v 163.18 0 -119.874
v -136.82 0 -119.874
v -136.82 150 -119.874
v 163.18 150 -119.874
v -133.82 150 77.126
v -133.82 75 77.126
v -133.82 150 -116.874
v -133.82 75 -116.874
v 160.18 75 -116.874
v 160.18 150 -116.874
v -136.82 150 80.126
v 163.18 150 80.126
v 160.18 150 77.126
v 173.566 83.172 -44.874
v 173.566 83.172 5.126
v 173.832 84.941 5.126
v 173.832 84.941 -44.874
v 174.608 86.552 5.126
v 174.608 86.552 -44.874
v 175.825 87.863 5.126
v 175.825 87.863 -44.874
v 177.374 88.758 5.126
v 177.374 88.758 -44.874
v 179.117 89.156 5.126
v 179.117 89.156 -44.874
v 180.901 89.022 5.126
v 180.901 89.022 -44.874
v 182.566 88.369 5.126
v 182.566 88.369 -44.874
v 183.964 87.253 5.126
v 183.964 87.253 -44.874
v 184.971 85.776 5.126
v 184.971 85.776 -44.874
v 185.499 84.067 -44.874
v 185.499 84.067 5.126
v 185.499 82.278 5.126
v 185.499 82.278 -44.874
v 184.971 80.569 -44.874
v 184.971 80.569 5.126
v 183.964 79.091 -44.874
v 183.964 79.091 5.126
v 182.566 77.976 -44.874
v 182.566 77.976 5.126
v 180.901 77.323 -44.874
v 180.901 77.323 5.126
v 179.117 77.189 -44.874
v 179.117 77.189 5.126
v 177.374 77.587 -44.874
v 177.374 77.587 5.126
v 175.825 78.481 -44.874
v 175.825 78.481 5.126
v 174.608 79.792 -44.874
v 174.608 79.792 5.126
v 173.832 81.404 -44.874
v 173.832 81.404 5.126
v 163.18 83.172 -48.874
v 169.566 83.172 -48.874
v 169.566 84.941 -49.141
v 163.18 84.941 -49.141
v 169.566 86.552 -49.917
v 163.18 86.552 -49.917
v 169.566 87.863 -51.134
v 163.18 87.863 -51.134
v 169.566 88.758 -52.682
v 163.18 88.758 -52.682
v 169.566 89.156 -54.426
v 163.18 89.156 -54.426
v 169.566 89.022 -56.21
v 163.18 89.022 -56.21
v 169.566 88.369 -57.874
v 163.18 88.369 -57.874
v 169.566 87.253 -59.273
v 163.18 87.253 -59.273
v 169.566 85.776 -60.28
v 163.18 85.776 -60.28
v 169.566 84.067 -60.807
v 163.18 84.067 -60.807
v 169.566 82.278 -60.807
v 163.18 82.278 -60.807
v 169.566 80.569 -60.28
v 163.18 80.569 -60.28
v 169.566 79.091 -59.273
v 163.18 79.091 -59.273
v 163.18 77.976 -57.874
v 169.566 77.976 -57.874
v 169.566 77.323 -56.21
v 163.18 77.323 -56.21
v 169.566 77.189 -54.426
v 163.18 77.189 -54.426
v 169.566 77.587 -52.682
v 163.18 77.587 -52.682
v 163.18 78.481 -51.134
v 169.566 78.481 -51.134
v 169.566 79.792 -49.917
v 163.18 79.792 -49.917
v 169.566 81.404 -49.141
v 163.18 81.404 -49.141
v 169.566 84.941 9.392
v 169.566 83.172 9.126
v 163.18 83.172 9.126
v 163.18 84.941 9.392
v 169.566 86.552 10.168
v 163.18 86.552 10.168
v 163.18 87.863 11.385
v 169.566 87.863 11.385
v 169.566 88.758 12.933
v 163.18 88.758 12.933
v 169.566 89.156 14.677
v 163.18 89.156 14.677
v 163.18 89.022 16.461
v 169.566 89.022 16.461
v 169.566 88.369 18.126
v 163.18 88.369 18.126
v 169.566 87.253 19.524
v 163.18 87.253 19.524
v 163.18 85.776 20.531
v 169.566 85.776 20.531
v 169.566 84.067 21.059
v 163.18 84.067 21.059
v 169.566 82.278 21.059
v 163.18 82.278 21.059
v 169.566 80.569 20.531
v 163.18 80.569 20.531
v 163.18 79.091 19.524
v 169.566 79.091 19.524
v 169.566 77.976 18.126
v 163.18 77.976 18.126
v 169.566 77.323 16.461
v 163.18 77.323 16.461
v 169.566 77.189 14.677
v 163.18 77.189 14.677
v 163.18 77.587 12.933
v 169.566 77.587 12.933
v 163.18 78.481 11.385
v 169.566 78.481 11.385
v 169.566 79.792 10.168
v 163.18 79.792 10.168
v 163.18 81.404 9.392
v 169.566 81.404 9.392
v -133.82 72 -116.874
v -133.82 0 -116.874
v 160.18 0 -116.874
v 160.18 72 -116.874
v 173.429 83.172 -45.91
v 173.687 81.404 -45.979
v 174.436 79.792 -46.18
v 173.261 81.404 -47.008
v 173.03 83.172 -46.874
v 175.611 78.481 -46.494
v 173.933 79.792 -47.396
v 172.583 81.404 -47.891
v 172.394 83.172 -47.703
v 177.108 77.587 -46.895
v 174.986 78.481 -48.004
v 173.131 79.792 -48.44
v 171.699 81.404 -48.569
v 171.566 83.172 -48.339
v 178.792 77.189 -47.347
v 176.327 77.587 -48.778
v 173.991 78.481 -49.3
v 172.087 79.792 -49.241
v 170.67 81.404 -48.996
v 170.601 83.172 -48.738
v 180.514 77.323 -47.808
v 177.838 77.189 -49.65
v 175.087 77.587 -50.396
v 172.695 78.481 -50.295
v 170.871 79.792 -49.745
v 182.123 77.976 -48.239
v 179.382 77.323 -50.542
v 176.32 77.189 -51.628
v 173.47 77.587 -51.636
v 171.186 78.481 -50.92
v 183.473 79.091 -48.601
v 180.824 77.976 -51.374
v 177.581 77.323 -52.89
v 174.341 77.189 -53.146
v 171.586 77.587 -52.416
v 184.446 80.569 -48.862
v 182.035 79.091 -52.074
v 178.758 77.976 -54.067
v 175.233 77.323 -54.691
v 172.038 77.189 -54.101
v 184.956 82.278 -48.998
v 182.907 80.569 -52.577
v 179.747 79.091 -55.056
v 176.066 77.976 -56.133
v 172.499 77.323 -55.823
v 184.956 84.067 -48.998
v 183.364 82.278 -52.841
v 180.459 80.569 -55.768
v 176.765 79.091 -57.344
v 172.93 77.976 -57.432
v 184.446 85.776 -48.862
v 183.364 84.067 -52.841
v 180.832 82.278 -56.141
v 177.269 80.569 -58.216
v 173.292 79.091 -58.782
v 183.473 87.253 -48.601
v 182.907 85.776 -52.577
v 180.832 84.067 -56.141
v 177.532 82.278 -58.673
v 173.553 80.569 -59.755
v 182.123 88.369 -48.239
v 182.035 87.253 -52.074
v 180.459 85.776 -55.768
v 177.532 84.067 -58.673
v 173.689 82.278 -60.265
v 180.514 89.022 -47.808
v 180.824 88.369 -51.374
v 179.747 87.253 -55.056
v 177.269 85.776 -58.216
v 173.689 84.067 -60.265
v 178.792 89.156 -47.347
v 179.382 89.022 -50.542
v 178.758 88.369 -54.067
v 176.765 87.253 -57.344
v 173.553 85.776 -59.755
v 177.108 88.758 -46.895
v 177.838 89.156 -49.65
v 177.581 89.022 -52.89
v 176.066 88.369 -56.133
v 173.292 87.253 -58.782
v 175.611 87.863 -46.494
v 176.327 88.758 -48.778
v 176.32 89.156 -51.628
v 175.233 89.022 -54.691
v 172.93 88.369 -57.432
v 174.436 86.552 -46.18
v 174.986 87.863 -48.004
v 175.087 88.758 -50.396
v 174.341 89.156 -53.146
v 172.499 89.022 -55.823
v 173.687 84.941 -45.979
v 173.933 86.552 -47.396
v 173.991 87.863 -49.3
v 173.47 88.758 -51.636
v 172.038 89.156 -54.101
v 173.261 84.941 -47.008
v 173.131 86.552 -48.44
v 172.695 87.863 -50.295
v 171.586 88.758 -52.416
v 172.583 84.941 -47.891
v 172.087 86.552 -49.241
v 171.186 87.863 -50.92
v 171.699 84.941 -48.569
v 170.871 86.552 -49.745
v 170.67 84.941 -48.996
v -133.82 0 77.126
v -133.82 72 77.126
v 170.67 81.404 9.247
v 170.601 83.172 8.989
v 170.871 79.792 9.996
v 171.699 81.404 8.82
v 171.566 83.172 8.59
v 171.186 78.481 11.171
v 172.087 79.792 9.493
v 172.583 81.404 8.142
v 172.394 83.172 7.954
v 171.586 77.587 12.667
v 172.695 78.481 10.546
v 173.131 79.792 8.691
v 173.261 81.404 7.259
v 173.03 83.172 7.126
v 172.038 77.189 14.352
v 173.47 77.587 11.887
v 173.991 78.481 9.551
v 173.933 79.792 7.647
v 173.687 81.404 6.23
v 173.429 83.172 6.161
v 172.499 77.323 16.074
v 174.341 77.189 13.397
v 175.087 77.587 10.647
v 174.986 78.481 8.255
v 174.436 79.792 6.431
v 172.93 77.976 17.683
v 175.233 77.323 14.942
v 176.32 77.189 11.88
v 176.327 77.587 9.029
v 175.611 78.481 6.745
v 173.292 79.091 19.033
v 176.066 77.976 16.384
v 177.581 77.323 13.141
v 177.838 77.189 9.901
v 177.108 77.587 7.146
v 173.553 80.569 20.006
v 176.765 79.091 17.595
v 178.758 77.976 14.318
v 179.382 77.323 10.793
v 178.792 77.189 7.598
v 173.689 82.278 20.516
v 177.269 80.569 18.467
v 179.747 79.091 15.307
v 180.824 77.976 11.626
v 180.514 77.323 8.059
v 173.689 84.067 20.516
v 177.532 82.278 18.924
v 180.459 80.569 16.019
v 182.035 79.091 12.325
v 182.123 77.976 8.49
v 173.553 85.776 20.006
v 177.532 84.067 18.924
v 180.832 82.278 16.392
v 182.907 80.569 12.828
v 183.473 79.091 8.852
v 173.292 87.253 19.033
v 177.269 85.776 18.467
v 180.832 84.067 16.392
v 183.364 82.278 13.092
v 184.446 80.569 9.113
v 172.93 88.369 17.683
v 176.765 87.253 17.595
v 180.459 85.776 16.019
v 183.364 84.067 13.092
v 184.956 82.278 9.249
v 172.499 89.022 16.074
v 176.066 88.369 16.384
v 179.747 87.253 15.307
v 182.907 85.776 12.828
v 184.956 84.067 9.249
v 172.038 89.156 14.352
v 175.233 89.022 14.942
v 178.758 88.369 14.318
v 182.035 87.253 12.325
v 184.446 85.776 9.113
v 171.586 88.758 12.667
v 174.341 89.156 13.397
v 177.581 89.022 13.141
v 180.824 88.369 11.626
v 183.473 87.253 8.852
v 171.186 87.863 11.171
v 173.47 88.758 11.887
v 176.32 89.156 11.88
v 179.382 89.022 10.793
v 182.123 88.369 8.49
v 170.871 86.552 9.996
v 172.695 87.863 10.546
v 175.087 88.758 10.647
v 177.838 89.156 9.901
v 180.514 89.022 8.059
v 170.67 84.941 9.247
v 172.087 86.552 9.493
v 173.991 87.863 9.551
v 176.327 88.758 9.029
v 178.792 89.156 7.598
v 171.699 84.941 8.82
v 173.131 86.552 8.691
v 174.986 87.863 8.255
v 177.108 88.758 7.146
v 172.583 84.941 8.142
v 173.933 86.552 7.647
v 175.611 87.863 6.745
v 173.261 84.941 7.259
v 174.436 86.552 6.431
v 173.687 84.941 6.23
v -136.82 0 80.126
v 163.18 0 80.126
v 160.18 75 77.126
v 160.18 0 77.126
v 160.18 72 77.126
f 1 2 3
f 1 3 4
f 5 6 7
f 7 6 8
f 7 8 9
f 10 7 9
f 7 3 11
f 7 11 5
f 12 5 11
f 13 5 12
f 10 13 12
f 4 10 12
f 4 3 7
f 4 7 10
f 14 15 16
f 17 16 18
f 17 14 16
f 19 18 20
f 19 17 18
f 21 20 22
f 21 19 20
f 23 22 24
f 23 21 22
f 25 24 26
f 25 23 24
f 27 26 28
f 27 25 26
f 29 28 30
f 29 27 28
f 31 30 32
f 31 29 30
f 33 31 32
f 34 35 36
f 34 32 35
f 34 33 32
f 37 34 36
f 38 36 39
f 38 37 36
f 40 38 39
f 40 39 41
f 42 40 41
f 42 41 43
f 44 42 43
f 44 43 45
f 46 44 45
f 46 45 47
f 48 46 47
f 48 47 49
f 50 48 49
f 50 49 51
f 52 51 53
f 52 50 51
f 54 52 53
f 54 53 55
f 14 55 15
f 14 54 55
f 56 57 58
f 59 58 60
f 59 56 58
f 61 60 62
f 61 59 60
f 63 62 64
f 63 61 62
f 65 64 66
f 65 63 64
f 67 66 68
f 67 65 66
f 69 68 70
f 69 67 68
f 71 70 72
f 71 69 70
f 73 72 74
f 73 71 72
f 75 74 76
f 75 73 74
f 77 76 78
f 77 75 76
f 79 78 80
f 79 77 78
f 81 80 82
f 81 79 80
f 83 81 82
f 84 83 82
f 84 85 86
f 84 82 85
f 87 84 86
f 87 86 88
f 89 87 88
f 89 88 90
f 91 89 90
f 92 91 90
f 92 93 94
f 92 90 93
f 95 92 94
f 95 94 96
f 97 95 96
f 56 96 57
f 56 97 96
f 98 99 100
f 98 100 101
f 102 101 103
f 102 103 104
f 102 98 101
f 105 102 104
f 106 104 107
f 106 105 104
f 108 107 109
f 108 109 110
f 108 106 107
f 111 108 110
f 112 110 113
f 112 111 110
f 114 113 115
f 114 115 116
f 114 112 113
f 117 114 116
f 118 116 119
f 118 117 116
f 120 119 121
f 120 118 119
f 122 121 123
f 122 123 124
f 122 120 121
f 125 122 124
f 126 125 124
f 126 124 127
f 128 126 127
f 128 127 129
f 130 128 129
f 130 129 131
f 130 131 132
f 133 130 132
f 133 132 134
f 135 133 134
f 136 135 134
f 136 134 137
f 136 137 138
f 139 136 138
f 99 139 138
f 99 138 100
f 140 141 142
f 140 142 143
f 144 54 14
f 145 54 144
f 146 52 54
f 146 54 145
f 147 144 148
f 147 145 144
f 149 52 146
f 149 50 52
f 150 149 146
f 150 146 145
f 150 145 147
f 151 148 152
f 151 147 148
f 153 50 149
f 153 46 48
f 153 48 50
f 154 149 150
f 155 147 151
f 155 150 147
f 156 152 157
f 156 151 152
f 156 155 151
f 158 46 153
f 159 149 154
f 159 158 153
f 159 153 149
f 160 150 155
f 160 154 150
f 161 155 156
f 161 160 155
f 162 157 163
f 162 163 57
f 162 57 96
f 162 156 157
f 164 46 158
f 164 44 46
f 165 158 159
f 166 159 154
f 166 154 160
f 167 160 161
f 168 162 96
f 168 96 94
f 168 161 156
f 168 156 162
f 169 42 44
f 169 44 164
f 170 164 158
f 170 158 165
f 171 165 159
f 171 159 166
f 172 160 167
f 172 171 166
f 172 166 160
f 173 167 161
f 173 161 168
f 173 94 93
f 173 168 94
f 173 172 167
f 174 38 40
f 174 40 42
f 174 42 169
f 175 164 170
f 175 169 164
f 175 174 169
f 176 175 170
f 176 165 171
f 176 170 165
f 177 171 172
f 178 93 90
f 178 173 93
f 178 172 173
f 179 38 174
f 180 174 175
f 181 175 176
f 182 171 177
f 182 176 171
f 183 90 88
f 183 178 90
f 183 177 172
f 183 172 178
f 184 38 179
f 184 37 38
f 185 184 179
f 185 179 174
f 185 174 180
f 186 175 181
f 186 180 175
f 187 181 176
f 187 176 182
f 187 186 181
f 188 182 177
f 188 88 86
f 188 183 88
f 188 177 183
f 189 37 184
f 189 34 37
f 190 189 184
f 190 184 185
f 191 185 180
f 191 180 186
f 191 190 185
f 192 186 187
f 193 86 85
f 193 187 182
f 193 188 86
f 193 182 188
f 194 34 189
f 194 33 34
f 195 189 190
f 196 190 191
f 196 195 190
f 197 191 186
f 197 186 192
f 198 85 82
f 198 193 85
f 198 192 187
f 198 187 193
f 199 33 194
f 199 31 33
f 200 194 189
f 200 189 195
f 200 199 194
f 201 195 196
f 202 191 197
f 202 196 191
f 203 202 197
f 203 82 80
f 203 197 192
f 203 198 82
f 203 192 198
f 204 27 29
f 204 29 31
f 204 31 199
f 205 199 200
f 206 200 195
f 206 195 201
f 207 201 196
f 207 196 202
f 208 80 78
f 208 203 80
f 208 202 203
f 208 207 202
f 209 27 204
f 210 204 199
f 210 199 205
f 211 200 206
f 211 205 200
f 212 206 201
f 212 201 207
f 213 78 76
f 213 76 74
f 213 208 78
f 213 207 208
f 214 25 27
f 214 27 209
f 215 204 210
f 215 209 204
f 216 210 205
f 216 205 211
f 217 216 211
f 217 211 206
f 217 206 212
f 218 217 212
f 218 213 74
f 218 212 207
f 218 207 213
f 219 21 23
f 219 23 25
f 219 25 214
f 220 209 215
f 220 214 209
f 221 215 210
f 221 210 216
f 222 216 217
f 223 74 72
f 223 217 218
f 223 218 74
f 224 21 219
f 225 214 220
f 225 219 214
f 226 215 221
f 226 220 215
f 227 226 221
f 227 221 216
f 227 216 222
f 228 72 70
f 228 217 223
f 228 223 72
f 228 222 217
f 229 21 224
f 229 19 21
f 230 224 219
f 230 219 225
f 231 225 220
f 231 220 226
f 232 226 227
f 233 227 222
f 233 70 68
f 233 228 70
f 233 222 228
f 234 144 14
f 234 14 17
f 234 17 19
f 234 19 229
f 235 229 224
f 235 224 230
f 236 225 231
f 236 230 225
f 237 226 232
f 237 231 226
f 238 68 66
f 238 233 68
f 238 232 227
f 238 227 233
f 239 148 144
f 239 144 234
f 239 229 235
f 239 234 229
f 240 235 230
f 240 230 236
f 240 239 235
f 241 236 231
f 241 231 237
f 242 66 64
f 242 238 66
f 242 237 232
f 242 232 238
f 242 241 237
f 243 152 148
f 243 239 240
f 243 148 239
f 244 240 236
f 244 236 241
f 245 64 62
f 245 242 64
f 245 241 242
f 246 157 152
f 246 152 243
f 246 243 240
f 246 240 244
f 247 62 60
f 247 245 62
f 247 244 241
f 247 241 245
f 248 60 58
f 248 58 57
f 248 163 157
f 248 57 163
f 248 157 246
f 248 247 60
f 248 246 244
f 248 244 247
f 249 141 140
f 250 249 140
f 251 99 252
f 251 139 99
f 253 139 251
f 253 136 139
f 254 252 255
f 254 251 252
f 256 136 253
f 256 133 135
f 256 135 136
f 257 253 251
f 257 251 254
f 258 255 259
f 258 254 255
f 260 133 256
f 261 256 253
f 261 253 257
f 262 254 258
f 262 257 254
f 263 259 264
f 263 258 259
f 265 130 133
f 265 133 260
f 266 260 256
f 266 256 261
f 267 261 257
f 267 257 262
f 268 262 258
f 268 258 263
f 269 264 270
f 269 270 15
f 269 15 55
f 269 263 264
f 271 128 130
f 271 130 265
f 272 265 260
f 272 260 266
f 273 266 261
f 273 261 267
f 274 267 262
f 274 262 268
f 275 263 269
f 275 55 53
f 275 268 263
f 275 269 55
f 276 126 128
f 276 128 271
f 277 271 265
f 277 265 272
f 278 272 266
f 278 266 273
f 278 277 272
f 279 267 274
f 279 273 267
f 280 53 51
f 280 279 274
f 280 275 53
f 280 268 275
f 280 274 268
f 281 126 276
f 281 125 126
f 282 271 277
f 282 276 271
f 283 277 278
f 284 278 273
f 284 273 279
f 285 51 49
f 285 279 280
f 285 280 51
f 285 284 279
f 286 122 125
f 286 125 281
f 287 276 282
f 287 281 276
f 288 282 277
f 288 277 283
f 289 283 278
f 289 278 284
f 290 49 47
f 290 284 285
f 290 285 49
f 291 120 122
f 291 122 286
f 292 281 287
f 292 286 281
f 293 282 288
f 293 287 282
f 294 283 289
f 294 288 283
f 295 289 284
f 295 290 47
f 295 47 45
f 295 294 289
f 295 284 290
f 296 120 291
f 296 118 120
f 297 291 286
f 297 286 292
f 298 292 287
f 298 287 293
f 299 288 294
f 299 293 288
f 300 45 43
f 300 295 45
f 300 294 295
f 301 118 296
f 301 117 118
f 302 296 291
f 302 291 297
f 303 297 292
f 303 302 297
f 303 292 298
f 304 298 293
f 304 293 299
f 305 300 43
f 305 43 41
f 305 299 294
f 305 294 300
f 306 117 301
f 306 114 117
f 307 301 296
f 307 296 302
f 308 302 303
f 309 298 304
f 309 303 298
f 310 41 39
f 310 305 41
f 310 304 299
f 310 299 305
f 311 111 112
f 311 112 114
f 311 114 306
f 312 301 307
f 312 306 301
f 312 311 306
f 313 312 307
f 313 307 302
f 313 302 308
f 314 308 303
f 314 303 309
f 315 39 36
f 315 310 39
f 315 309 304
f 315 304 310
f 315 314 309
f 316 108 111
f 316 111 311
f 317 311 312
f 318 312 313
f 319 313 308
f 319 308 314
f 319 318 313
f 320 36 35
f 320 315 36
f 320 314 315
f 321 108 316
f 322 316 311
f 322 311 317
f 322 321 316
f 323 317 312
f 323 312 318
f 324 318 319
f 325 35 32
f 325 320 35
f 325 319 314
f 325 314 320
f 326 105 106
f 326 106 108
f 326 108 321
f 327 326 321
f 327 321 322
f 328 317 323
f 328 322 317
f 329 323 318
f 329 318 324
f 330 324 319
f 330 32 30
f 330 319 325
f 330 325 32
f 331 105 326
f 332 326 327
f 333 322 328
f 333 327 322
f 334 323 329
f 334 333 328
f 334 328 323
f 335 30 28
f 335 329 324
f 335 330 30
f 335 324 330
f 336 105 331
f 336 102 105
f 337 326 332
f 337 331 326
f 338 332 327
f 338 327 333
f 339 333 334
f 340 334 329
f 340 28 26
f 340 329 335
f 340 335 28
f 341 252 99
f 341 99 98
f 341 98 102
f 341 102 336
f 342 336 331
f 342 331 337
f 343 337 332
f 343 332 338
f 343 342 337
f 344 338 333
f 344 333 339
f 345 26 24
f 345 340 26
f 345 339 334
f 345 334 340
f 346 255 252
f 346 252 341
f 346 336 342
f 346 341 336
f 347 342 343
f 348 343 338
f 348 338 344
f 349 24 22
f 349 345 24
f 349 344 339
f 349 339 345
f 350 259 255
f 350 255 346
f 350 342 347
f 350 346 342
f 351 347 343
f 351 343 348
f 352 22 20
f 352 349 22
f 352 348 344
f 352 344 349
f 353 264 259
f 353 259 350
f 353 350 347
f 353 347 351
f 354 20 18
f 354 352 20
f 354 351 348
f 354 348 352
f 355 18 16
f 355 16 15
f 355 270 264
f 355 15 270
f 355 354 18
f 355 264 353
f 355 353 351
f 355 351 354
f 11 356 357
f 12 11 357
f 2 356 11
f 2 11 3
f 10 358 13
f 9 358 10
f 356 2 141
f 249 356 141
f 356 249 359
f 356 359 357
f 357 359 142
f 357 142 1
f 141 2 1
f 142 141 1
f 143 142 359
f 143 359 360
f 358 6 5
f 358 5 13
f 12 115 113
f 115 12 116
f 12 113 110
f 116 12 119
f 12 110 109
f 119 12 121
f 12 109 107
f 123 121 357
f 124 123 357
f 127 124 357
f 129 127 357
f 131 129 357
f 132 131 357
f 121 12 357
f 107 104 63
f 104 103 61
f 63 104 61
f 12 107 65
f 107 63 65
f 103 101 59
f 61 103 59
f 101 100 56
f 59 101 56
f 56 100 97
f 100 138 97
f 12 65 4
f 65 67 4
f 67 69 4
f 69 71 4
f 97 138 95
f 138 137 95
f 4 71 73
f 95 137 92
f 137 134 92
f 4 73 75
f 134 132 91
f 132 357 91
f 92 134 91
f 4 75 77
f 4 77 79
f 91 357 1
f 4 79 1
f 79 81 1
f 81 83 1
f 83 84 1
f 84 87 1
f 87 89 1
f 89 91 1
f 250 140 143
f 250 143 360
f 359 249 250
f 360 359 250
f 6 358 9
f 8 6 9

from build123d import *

# Parameters (mm, degrees)
SKETCH1_W                 = 300
SKETCH1_H                 = 200
BOSS_EXTRUDE1_DEPTH       = 150
SHELL1_T                  = -3
SHELL1_THICKNESS_2_FACE_W = 194
SHELL1_THICKNESS_2_FACE_H = 294
SHELL1_THICKNESS_2_DEPTH  = 72
SHELL2_START              = -133.820083682
SHELL2_OUTLINE_W          = 72
SHELL2_OUTLINE_H          = 194
SHELL2_DEPTH              = 294
SKETCH2_R                 = 6


# Read off the part's stored shape, not the designer's step: Shell2
with BuildPart() as part:
    # Sketch1 → Boss-Extrude1 (new body)
    with BuildSketch(Plane(origin=(0, 0, 0), x_dir=(1, 0, 0), z_dir=(0, 1, 0))):
        with Locations((13.179916318, 19.874476987)):
            Rectangle(SKETCH1_W, SKETCH1_H)
    extrude(amount=BOSS_EXTRUDE1_DEPTH)

    # Shell1
    shell1_openings = [part.faces().sort_by_distance(p)[0] for p in [
        (13.179916318, 150, -19.874476987),
    ]]
    offset(amount=SHELL1_T, openings=shell1_openings, kind=Kind.INTERSECTION)

    # Shell1 thickness 2 face (on inner face of the shell) → Shell1 thickness 2 (add)
    with BuildSketch(Plane(origin=(13.179916318, 3, -19.874476987), x_dir=(0, 0, -1), z_dir=(0, -1, 0))):
        Rectangle(SHELL1_THICKNESS_2_FACE_W, SHELL1_THICKNESS_2_FACE_H)
    extrude(amount=-SHELL1_THICKNESS_2_DEPTH)

    # Shell2 outline → Shell2 (cut)
    with BuildSketch(Plane.YZ.offset(SHELL2_START)):
        with Locations((36, -19.874476987)):
            Rectangle(SHELL2_OUTLINE_W, SHELL2_OUTLINE_H)
    extrude(amount=SHELL2_DEPTH, mode=Mode.SUBTRACT)

    # Sweep2: sweep along a path in Sketch4
    with BuildLine(Plane(origin=(0, 83.172395684, 0), x_dir=(1, 0, 0), z_dir=(0, 1, 0))) as sweep2_path:
        Line((163.179916318, -15.125523013), (169.565605174, -15.125523013))
        ThreePointArc((169.565605174, -15.125523013), (176.636672985, -12.196590824), (179.565605174, -5.125523013))
        Line((179.565605174, -5.125523013), (179.565605174, 44.874476987))
        ThreePointArc((179.565605174, 44.874476987), (176.636672985, 51.945544799), (169.565605174, 54.874476987))
        Line((169.565605174, 54.874476987), (163.179916318, 54.874476987))
    # Sketch2 → Sweep2 (sweep)
    with BuildSketch(Plane(origin=(163.179916318, 0, 0), x_dir=(0, 0, -1), z_dir=(1, 0, 0))):
        with Locations((-15.125523013, 83.172395684)):
            Circle(SKETCH2_R)
    sweep(path=sweep2_path.line)


solid = part.part
